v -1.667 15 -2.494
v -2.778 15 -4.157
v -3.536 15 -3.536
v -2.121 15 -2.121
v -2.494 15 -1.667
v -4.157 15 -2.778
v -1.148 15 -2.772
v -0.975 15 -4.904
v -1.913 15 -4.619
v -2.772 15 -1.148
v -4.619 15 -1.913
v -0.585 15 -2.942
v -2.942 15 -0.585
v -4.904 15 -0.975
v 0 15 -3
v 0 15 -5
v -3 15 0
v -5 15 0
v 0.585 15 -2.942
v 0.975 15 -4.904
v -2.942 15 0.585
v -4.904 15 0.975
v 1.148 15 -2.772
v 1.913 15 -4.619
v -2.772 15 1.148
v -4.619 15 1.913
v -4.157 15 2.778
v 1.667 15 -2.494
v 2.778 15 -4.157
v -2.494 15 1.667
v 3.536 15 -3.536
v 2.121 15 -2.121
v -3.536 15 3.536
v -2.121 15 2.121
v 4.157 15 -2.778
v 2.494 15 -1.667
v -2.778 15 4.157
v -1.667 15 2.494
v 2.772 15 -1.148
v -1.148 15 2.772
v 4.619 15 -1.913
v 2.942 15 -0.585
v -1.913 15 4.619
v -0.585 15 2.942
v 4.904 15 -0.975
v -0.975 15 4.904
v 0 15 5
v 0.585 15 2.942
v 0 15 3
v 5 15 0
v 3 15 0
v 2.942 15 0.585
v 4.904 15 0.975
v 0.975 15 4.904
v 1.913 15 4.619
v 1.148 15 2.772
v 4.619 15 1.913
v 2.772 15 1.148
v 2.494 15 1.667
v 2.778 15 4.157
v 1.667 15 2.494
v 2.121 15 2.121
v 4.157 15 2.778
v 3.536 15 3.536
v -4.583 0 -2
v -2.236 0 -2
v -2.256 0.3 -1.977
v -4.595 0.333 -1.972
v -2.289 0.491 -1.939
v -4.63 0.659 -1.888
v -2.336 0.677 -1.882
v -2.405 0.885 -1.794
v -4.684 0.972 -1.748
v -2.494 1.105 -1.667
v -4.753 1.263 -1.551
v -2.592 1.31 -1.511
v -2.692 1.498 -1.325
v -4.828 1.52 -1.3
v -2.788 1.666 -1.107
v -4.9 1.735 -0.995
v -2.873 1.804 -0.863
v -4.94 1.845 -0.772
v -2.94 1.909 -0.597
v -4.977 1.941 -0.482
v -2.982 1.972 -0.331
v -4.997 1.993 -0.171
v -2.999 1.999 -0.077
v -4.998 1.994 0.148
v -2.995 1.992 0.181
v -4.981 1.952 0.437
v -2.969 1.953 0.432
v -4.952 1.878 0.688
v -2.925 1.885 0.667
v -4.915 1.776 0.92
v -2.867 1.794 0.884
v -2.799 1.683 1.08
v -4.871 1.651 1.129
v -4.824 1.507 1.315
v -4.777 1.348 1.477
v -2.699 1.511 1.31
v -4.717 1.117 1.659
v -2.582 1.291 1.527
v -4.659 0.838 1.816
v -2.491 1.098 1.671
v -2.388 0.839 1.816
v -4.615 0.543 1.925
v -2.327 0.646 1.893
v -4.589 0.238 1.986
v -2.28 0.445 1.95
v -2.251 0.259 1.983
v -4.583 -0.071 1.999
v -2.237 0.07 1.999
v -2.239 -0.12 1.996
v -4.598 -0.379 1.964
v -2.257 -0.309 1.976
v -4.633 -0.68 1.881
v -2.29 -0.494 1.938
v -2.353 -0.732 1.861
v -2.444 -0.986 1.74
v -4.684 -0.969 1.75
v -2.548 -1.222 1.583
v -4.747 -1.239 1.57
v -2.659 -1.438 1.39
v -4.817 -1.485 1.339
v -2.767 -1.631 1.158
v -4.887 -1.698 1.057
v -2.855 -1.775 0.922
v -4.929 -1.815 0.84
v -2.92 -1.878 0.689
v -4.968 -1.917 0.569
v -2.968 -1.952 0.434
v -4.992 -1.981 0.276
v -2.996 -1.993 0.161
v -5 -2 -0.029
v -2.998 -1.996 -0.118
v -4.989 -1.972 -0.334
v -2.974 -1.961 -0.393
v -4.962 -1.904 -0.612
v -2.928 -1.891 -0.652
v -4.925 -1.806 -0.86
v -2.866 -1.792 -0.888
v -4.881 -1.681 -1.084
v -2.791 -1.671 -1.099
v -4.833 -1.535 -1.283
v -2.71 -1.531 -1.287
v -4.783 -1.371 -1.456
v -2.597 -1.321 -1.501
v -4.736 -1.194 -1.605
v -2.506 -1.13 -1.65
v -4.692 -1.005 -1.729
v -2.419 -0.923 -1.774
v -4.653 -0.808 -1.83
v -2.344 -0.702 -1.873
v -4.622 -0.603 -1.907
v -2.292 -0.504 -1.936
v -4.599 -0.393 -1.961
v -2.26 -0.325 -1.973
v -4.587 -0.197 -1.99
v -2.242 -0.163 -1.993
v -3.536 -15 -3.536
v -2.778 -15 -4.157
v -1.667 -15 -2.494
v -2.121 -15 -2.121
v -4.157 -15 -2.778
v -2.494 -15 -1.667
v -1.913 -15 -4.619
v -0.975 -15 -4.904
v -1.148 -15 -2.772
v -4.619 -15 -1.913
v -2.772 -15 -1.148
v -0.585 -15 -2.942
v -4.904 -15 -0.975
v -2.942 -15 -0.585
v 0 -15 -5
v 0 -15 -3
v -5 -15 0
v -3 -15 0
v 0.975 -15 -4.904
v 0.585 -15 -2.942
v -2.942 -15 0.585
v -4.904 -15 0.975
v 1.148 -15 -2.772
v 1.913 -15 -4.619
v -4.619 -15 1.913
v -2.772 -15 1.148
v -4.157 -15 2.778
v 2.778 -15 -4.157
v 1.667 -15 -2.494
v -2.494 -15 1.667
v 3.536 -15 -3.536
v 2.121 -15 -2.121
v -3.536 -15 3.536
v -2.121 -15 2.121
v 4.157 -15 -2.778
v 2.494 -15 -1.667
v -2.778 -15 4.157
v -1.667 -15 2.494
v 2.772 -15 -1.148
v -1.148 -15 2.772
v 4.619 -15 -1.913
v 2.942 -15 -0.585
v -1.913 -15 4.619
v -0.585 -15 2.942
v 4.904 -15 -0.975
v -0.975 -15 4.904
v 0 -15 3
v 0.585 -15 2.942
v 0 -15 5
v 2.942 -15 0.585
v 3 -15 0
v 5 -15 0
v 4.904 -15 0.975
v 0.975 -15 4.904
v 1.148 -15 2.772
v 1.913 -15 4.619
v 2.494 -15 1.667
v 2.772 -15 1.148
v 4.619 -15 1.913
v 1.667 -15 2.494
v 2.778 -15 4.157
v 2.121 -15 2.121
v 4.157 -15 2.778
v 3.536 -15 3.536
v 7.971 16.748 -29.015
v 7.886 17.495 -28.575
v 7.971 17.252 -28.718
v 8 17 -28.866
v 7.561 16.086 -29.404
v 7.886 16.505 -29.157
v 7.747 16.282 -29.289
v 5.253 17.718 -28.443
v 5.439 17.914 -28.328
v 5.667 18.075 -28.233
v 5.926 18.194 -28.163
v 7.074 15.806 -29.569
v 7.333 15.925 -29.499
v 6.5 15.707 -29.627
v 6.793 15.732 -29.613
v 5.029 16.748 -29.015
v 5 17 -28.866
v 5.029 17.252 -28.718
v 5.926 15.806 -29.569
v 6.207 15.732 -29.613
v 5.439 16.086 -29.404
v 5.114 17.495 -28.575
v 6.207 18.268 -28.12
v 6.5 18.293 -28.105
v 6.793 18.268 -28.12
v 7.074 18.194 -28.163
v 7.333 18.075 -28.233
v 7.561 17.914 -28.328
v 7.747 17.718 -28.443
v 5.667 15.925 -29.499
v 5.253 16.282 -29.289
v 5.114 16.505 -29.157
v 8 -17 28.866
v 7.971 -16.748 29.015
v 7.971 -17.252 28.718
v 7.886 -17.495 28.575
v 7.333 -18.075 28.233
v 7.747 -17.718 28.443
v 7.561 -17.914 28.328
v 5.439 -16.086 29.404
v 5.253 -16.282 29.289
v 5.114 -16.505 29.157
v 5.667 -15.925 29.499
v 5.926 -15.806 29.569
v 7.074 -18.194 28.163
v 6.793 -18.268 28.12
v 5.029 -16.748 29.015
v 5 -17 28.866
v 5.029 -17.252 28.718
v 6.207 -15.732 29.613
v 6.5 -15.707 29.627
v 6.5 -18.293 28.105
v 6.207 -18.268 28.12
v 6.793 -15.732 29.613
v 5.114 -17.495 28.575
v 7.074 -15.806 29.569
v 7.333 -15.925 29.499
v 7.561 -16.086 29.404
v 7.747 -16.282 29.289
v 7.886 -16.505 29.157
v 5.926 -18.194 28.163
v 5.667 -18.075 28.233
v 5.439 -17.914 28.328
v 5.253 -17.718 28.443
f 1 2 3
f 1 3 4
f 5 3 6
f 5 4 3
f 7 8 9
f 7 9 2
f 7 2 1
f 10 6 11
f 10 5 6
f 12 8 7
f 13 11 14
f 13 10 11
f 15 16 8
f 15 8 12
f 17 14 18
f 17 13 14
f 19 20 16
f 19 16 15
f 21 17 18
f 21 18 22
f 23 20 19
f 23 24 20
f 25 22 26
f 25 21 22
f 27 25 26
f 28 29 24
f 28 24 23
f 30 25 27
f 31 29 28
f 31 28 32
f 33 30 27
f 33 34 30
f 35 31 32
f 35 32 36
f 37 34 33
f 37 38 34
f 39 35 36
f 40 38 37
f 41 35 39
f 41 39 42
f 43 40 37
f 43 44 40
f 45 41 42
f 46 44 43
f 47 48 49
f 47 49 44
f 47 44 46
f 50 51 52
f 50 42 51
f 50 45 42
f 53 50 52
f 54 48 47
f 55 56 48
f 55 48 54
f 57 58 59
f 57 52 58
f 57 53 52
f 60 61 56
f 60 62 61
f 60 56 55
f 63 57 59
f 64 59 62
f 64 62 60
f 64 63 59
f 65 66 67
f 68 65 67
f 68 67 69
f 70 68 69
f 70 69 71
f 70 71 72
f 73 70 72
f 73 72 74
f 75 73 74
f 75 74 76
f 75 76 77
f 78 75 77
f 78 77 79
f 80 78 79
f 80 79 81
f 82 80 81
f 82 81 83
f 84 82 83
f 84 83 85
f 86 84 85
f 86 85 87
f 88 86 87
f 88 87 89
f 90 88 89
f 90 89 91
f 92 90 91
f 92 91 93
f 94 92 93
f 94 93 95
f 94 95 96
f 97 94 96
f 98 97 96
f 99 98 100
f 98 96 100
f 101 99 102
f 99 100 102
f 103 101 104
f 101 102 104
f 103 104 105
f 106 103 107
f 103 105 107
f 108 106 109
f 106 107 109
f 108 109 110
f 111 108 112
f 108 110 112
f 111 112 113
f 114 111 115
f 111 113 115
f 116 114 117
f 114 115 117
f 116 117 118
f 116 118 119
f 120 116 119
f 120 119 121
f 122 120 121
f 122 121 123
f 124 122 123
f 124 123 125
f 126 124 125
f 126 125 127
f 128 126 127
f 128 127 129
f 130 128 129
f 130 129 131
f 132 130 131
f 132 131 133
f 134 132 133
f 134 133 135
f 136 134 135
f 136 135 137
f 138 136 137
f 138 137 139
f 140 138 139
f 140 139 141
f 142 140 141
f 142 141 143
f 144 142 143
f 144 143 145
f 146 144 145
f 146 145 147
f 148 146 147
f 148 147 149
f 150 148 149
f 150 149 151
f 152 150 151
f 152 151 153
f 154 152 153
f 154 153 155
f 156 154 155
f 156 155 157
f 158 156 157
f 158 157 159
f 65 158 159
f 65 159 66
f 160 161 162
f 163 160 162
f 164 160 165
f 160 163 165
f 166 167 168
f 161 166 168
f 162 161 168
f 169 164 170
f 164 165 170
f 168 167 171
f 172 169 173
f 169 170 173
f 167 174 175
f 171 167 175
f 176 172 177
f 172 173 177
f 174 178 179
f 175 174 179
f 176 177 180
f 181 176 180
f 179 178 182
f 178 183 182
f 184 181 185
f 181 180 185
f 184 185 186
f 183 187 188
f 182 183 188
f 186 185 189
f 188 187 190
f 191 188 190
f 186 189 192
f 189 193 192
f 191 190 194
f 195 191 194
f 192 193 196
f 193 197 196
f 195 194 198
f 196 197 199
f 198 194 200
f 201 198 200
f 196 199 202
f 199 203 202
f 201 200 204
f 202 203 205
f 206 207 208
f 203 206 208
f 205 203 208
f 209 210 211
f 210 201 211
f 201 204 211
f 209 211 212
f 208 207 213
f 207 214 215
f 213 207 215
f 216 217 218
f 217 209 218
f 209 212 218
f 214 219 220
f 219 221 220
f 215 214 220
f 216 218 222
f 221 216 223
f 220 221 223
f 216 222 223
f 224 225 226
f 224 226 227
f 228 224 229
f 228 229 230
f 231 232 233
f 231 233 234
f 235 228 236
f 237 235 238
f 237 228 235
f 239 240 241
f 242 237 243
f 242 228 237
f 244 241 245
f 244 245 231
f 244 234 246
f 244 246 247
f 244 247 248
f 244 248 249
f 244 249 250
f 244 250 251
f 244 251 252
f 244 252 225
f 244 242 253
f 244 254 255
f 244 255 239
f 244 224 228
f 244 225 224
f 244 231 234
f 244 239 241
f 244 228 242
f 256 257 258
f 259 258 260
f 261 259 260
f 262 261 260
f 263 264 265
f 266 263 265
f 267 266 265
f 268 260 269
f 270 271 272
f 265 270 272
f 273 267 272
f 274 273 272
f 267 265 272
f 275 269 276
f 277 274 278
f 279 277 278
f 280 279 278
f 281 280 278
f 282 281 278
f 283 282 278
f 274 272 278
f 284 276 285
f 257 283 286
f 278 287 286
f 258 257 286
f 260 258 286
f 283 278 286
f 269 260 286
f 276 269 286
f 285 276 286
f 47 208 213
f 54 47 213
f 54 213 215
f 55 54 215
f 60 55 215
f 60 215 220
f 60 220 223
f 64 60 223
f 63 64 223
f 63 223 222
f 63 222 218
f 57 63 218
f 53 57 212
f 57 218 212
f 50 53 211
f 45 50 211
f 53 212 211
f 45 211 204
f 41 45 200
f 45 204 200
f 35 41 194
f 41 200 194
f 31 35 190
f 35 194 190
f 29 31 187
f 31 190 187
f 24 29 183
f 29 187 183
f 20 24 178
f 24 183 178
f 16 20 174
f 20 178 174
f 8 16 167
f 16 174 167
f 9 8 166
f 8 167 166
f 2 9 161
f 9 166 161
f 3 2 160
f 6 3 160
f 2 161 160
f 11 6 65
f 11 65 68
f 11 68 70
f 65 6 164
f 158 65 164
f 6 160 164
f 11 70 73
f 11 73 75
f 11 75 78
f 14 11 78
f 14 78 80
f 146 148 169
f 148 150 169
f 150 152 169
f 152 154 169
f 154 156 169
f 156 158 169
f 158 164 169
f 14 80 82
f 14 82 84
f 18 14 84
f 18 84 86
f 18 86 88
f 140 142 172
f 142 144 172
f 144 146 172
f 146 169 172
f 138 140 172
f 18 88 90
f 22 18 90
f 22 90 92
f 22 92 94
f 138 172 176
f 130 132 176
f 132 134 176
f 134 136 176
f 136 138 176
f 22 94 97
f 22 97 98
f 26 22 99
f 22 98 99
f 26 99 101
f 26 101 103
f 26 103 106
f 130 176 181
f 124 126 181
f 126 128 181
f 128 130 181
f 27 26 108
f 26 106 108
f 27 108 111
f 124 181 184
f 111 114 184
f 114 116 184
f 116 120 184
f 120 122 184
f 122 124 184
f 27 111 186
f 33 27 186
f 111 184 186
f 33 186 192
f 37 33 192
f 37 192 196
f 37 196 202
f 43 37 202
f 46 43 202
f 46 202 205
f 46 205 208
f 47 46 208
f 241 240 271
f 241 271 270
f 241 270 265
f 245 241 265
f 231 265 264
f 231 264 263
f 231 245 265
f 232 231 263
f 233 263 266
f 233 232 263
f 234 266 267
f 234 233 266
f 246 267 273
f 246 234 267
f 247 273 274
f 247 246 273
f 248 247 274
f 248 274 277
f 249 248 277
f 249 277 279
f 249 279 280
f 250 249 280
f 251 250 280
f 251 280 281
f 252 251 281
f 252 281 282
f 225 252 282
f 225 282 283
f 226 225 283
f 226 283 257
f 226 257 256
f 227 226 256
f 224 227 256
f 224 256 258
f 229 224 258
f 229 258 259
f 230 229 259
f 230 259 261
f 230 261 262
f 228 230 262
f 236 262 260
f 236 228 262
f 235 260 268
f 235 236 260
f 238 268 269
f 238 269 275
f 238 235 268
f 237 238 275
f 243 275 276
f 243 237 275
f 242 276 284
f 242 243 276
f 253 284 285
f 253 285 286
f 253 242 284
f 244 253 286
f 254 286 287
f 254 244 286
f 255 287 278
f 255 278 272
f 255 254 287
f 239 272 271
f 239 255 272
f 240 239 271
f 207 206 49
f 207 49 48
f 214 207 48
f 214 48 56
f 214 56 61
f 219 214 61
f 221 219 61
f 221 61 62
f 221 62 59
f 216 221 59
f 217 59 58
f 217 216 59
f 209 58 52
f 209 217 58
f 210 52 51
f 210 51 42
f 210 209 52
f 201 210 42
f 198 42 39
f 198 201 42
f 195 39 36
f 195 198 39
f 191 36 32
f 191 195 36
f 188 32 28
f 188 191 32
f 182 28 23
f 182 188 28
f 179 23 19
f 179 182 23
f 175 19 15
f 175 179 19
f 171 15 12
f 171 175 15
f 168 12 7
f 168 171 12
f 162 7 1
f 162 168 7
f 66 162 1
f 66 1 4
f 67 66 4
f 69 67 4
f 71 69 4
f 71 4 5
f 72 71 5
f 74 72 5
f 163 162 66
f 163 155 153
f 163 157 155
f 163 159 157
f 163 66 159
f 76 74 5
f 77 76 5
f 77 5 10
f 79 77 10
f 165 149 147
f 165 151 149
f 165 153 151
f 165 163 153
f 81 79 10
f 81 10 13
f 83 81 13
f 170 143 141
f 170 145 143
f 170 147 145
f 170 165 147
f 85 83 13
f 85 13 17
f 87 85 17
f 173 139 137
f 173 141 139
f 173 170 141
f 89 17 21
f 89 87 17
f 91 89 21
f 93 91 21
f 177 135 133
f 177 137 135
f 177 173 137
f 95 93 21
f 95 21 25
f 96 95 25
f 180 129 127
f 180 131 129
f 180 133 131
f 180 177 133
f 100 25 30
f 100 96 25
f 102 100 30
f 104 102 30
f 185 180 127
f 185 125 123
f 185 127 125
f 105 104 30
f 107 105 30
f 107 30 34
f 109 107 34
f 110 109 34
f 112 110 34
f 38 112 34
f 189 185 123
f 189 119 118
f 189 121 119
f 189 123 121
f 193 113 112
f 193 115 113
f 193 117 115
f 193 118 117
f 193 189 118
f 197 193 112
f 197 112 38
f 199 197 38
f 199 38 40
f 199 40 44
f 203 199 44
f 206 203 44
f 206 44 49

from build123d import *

# Parameters (mm, degrees)
EXTRUDE_1_DEPTH      = 15
EXTRUDE_1_DEPTH_BACK = 15
SKETCH_1_R           = 5
SKETCH_1_R_2         = 3
SKETCH_3_R           = 1.5
SKETCH_4_R           = 2
CUT_EXTRUDE_1_DEPTH  = 15


with BuildPart() as part:
    # Эскиз1 → Бобышка-Вытянуть1 (new, two sides: drawn at the far end of the back side and taken through both)
    with BuildSketch(Plane(origin=(0, 0, 0), x_dir=(1, 0, 0), z_dir=(0, 1, 0)).offset(-EXTRUDE_1_DEPTH_BACK)):
        Circle(SKETCH_1_R)
        Circle(SKETCH_1_R_2, mode=Mode.SUBTRACT)
    extrude(amount=EXTRUDE_1_DEPTH + EXTRUDE_1_DEPTH_BACK)

    # Эскиз4 → Вырез-Вытянуть1 (cut)
    with BuildSketch(Plane(origin=(0, 0, 0), x_dir=(0, 0, -1), z_dir=(1, 0, 0))):
        Circle(SKETCH_4_R)
    extrude(amount=-CUT_EXTRUDE_1_DEPTH, mode=Mode.SUBTRACT)


with BuildPart() as body_2:
    # По траектории1: sweep along a path in Эскиз2
    with BuildLine(Plane(origin=(5, 0, 0), x_dir=(0, 0, -1), z_dir=(1, 0, 0))) as sweep_1_path:
        Line((-28.866070048, -17), (28.866070048, 17))
    # Эскиз3 → По траектории1 (sweep)
    with BuildSketch(Plane(origin=(5, -17, 28.866070048), x_dir=(-1, 0, 0), z_dir=(0, 0.5074626865671642, -0.8616737327678246))):
        with Locations((-1.5, 0)):
            Circle(SKETCH_3_R)
    sweep(path=sweep_1_path.line)


solid = Compound([part.part, body_2.part])
